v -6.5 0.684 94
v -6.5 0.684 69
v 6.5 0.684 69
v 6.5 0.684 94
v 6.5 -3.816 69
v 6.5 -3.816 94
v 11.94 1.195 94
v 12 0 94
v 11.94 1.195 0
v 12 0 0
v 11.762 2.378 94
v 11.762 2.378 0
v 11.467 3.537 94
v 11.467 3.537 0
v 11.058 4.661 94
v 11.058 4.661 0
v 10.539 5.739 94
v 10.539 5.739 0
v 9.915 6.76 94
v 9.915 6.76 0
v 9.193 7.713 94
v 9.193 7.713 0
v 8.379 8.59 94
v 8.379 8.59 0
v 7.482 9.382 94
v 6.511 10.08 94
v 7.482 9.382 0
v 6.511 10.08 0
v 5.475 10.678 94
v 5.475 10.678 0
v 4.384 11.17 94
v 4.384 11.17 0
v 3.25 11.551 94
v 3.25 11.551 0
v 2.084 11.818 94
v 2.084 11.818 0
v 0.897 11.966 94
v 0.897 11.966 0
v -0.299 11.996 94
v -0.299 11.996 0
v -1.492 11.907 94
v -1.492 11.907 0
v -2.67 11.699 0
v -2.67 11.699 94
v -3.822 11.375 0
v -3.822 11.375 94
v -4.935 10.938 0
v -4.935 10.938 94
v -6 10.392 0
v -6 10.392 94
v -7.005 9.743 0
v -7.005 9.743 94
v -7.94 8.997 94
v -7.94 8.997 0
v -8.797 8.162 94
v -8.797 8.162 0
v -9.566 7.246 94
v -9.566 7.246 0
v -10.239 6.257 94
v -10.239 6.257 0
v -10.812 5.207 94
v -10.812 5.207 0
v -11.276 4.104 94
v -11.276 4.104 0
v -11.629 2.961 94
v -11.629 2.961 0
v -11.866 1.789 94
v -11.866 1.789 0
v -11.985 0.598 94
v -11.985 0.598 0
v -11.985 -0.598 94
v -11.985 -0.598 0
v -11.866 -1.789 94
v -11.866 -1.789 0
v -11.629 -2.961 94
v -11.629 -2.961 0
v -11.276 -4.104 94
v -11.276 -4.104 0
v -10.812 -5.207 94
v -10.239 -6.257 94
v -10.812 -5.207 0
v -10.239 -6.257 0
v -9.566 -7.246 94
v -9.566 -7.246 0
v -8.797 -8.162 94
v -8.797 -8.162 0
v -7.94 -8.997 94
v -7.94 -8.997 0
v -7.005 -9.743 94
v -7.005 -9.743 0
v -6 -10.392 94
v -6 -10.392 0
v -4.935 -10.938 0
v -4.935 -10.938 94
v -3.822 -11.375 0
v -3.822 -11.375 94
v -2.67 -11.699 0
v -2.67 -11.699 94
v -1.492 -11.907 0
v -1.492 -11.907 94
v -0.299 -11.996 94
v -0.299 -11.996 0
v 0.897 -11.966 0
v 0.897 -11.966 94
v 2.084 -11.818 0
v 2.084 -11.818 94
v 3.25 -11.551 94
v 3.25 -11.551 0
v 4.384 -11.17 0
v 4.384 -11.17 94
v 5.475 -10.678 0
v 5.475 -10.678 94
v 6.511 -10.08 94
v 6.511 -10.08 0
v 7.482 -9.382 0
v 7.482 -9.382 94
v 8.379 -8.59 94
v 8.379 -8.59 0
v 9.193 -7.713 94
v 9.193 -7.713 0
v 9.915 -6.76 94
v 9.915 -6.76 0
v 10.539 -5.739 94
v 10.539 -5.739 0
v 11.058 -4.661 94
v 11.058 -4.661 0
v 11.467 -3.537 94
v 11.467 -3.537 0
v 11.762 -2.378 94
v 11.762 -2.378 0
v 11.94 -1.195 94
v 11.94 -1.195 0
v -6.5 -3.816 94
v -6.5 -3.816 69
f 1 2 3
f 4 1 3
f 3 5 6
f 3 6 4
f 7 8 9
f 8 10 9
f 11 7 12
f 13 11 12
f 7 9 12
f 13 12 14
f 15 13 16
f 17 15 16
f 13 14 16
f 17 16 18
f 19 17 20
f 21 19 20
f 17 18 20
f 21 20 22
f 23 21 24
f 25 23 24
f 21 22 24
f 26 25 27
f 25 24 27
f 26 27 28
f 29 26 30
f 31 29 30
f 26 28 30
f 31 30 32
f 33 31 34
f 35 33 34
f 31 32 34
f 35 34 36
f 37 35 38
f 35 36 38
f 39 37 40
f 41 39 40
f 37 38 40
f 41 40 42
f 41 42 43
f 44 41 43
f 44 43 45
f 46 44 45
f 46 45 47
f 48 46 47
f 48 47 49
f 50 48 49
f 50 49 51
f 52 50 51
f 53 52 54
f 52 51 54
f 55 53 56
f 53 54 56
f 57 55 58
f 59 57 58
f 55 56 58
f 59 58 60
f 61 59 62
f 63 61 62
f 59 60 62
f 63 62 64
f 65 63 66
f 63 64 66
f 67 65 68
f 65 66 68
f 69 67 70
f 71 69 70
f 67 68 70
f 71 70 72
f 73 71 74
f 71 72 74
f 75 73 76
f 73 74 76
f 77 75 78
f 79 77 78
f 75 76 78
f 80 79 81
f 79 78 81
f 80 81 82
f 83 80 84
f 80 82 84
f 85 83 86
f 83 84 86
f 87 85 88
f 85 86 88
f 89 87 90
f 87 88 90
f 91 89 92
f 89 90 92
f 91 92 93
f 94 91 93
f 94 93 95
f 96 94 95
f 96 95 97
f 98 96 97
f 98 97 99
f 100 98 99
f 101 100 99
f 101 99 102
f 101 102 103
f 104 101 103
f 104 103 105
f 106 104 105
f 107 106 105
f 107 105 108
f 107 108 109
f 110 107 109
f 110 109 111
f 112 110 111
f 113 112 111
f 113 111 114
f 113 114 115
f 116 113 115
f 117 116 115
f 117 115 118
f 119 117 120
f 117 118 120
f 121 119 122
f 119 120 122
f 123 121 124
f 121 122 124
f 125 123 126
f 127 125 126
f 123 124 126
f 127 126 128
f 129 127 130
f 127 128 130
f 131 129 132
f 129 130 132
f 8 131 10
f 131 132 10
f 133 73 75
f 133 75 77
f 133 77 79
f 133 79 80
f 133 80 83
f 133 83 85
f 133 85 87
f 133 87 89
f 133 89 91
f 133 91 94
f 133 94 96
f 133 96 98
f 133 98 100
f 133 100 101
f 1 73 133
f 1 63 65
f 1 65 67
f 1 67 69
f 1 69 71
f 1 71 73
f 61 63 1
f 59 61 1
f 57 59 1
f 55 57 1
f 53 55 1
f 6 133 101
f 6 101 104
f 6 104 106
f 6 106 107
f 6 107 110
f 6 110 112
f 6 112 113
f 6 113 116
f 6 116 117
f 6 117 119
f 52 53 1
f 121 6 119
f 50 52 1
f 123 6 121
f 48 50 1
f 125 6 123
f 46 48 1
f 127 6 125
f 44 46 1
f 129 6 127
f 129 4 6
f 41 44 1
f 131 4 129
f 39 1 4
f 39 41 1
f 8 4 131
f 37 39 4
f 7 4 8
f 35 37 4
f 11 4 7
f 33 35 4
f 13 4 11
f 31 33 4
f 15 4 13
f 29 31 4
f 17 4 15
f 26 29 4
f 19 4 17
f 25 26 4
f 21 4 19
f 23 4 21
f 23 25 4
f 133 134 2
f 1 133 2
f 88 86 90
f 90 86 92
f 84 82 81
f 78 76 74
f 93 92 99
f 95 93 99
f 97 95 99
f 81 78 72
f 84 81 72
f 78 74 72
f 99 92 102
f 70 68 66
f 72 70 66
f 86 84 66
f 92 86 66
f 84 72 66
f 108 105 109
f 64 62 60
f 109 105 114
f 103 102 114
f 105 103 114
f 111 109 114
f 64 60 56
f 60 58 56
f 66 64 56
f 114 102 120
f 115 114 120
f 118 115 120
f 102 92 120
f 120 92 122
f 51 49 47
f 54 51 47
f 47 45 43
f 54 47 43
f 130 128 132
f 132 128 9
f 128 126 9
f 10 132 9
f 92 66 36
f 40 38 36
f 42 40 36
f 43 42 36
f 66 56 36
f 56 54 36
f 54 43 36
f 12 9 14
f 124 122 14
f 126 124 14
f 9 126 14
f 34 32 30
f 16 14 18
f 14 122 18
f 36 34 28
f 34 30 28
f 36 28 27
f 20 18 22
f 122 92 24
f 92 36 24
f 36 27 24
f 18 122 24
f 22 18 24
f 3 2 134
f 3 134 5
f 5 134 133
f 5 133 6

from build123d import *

# Parameters (mm, degrees)
CROQUIS1_R              = 12
SALIENTE_EXTRUIR1_DEPTH = 69
CROQUIS2_R              = 12
CROQUIS2_W              = 13
CROQUIS2_H              = 4.5
SALIENTE_EXTRUIR2_DEPTH = 25


with BuildPart() as part:
    # Croquis1 → Saliente-Extruir1 (new body)
    with BuildSketch(Plane.XY):
        Circle(CROQUIS1_R)
    extrude(amount=SALIENTE_EXTRUIR1_DEPTH)

    # Croquis2 → Saliente-Extruir2 (add)
    with BuildSketch(Plane.XY.offset(69)):
        Circle(CROQUIS2_R)
        with Locations((0, -1.565571557)):
            Rectangle(CROQUIS2_W, CROQUIS2_H, mode=Mode.SUBTRACT)
    extrude(amount=SALIENTE_EXTRUIR2_DEPTH)


solid = part.part
